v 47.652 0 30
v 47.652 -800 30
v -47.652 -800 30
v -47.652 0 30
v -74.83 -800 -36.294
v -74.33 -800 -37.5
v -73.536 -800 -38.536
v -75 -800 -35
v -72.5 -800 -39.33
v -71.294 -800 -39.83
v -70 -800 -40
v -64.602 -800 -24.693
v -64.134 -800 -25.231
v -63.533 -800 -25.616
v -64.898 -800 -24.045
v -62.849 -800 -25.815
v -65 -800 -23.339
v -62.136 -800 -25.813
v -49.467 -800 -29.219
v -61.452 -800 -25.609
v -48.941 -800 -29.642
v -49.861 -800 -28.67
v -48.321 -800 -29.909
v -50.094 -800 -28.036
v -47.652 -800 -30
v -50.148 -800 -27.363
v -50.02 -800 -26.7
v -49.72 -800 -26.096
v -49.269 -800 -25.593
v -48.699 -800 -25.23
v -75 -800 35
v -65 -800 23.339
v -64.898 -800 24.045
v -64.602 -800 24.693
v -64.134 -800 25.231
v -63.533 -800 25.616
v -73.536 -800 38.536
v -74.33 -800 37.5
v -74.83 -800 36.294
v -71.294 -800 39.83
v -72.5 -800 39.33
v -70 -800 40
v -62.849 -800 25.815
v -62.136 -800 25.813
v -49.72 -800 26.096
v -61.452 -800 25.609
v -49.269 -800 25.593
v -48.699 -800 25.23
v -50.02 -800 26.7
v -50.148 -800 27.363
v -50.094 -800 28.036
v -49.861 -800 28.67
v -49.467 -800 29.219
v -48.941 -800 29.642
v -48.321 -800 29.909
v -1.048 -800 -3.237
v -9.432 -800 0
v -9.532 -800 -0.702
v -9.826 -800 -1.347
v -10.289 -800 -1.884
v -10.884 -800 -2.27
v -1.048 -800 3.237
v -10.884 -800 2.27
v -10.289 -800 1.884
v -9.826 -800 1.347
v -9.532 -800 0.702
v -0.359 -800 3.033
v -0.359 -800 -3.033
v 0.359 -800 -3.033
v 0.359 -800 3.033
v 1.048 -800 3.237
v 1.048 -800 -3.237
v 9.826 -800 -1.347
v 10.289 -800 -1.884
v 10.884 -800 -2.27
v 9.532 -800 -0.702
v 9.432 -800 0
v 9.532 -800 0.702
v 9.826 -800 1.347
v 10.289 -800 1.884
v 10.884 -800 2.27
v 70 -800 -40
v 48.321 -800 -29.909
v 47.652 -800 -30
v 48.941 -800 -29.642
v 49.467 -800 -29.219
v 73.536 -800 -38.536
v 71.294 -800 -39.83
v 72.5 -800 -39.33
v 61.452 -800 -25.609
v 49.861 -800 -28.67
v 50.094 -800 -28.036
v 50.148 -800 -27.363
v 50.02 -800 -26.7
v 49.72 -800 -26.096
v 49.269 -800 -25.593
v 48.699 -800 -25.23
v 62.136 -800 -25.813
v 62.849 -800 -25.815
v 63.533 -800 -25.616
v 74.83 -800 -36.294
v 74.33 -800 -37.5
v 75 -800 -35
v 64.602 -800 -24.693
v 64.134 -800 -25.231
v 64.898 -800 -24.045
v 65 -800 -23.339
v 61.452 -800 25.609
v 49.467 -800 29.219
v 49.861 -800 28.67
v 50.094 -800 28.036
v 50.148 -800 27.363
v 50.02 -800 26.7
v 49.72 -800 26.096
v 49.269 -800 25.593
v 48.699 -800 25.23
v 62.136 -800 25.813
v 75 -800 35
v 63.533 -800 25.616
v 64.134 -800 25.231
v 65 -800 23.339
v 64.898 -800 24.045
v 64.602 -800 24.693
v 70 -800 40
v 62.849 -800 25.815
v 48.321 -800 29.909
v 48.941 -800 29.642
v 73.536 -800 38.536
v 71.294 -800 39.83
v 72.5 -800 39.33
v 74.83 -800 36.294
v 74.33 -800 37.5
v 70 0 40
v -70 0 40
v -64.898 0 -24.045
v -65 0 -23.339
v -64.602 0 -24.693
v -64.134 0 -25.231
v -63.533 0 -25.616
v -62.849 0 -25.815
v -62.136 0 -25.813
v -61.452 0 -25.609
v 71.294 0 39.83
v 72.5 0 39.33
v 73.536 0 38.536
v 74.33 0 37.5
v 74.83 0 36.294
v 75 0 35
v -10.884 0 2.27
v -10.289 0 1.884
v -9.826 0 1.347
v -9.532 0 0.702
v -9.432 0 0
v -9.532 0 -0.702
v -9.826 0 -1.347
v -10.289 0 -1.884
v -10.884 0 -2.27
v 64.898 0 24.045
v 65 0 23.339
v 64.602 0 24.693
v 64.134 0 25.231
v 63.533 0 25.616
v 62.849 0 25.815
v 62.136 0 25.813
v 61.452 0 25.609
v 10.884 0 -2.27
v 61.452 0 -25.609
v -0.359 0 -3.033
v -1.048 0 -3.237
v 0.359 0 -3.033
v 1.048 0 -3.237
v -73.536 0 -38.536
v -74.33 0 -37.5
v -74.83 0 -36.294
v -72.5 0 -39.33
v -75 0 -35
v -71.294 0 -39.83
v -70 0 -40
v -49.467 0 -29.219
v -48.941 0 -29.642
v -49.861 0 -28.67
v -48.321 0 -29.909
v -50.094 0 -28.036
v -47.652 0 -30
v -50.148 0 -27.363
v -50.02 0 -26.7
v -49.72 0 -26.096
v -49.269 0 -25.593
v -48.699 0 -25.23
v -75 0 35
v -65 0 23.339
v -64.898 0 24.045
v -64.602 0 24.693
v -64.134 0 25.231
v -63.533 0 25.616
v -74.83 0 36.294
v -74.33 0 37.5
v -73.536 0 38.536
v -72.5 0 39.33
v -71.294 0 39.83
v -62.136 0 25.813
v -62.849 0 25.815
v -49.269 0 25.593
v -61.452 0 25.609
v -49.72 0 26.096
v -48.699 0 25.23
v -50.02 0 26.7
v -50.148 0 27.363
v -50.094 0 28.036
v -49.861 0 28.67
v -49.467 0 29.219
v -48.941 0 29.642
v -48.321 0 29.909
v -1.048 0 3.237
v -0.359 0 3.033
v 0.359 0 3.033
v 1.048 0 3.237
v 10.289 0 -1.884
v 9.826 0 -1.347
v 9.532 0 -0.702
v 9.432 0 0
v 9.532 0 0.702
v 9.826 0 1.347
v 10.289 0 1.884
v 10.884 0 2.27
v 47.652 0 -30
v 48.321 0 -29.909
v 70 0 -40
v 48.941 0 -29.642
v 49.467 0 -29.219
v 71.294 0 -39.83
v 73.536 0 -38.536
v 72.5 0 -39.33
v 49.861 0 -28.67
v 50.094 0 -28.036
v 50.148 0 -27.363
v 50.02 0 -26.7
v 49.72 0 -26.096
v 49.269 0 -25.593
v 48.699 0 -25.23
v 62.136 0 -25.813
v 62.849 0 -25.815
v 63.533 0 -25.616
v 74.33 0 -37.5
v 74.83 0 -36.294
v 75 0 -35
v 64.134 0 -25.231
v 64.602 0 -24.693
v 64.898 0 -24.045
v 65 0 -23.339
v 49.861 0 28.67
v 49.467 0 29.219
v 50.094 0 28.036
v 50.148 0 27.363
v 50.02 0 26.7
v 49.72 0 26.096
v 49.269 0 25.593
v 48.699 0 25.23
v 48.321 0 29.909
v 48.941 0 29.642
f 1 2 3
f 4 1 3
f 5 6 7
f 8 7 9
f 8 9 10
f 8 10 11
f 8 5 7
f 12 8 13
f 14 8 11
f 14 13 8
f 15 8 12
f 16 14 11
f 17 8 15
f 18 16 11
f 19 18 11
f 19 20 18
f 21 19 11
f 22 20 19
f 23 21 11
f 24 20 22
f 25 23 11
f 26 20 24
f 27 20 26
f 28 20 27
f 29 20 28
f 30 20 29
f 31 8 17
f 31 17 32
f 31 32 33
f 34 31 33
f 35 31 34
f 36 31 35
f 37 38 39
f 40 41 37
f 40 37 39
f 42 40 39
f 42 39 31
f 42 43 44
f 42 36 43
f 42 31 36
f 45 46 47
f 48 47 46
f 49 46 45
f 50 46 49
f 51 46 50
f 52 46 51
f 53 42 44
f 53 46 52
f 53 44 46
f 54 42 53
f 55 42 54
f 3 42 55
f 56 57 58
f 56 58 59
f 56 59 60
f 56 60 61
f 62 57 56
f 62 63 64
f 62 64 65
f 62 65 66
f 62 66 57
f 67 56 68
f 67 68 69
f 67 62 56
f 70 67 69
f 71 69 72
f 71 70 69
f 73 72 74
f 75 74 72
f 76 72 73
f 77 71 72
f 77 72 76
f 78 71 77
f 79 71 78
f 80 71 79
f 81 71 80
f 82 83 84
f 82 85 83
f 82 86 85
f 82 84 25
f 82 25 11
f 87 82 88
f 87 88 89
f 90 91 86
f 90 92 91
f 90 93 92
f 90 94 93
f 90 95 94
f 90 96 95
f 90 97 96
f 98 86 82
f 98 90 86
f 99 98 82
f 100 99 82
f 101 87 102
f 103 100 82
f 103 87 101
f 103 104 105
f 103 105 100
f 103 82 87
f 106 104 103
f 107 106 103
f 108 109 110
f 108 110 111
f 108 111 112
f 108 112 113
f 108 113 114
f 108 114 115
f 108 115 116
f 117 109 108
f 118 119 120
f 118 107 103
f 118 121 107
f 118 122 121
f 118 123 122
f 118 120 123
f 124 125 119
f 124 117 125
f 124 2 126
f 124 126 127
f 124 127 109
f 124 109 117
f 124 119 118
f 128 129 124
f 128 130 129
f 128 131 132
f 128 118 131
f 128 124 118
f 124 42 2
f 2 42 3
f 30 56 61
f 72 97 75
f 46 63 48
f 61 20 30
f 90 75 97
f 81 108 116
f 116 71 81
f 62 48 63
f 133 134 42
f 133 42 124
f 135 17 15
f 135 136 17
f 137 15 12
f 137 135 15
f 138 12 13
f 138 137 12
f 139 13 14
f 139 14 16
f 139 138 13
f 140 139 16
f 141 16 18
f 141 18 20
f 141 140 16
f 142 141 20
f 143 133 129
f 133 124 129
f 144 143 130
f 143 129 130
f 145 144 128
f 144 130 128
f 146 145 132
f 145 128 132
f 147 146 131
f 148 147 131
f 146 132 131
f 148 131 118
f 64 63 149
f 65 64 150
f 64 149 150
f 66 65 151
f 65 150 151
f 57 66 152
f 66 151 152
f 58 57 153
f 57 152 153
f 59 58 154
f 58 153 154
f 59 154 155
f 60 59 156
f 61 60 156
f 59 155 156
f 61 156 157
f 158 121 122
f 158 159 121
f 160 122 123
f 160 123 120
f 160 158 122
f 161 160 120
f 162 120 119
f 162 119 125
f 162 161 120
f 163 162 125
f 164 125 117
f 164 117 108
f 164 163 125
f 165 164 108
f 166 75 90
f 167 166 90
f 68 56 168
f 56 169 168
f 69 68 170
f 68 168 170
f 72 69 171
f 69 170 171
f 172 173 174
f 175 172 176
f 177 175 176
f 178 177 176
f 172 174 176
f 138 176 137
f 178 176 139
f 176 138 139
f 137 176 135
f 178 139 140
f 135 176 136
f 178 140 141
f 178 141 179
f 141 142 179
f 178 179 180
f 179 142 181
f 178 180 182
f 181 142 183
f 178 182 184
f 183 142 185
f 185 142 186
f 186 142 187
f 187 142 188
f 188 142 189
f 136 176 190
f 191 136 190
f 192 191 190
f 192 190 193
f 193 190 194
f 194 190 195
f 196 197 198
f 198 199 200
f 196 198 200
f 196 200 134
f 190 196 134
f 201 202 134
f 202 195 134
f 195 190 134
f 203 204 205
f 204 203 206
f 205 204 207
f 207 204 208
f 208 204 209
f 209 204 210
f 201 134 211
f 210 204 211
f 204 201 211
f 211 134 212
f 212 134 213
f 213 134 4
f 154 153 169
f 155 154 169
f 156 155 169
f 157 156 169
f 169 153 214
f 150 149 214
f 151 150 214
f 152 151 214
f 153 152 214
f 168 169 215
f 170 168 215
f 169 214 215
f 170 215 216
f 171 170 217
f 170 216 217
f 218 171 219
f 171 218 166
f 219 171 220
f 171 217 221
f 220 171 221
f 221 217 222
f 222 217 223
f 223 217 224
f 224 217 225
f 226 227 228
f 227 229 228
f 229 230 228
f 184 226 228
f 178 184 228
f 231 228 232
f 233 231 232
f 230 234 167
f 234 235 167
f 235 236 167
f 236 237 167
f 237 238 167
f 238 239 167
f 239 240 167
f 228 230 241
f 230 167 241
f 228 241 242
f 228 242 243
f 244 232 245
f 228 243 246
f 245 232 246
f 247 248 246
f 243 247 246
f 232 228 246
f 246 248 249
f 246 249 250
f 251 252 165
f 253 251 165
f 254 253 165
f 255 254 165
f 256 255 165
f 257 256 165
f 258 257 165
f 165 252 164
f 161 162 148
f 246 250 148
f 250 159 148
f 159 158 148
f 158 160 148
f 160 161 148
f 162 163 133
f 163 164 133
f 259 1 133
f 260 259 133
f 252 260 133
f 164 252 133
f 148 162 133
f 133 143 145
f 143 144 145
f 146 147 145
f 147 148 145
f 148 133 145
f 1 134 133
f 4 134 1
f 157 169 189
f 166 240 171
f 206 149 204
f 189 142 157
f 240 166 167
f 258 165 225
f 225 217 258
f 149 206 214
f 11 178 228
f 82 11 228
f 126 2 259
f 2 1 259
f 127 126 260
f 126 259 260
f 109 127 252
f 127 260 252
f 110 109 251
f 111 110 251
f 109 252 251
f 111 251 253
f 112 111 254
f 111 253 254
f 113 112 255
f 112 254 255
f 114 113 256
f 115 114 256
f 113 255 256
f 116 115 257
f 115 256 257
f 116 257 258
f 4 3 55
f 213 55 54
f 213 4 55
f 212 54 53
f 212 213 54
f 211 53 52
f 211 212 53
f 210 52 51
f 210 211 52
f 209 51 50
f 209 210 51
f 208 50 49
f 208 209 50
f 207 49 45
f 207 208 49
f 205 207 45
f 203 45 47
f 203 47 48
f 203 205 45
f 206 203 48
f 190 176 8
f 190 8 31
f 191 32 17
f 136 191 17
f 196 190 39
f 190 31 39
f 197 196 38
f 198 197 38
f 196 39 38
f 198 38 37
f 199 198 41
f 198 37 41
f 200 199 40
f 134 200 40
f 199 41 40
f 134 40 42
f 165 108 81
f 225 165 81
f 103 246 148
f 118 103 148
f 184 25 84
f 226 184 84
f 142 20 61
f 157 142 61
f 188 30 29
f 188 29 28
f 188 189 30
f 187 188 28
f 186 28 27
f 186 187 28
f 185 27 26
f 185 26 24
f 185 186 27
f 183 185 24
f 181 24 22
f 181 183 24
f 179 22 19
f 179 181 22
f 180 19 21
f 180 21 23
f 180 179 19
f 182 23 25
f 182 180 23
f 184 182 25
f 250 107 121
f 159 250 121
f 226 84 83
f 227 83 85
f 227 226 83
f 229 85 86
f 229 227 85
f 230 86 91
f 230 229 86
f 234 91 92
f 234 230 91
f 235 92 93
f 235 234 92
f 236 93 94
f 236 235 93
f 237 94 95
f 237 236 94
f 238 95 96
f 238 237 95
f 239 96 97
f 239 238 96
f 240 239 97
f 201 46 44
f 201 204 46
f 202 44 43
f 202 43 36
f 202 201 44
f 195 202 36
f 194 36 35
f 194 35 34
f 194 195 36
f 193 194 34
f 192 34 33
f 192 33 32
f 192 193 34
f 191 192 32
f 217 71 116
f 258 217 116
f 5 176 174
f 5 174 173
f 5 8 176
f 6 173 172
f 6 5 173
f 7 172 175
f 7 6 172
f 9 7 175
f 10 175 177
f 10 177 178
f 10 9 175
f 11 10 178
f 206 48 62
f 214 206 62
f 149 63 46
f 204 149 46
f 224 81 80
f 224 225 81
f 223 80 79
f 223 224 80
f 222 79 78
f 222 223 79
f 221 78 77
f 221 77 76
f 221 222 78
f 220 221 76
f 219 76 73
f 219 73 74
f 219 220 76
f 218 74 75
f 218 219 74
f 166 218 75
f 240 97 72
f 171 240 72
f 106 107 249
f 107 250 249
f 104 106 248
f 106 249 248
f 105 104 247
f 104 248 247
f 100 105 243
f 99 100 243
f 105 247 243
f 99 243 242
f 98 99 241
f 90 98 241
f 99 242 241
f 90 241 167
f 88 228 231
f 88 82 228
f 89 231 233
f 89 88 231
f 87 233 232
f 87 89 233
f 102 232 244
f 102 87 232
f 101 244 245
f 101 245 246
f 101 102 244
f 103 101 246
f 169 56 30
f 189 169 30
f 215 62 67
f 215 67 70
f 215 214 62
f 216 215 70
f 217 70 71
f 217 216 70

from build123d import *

# Parameters (mm, degrees)
F0_W     = 150
F0_H     = 80
F1_DEPTH = 800
F3_DEPTH = 800.001
F4_R     = 2.5
F5_R     = 5


with BuildPart() as f1:
    # F0 (on Front) → F1 (new body)
    with BuildSketch(Plane.XZ):
        Rectangle(F0_W, F0_H)
    extrude(amount=F1_DEPTH)

    # F2 (on face) → F3 (cut, through all)
    with BuildSketch(Plane.XZ.offset(800)):
        Polygon((59.034241, 30), (-59.034241, 30), (0, 2.753427), align=None)
        Polygon((0, -2.753427), (-59.034241, -30), (59.034241, -30), align=None)
        Polygon((-5.965759, 0), (-65, 27.246573), (-65, -27.246573), align=None)
        Polygon((65, -27.246573), (65, 27.246573), (5.965759, 0), align=None)
    extrude(amount=-F3_DEPTH, mode=Mode.SUBTRACT)

    # F4
    f4_edges = [f1.edges().sort_by_distance(p)[0] for p in [
        (-59.034241, -400, 30),
        (5.965759, -400, 0),
        (0, -400, -2.753427),
        (-5.965759, -400, 0),
        (0, -400, 2.753427),
        (65, -400, -27.246573),
        (65, -400, 27.246573),
        (59.034241, -400, 30),
        (-65, -400, 27.246573),
        (-65, -400, -27.246573),
        (-59.034241, -400, -30),
        (59.034241, -400, -30),
    ]]
    fillet(f4_edges, radius=F4_R)

    # F5
    f5_edges = [f1.edges().sort_by_distance(p)[0] for p in [
        (-75, -400, 40),
        (-75, -400, -40),
        (75, -400, 40),
        (75, -400, -40),
    ]]
    fillet(f5_edges, radius=F5_R)


solid = f1.part
